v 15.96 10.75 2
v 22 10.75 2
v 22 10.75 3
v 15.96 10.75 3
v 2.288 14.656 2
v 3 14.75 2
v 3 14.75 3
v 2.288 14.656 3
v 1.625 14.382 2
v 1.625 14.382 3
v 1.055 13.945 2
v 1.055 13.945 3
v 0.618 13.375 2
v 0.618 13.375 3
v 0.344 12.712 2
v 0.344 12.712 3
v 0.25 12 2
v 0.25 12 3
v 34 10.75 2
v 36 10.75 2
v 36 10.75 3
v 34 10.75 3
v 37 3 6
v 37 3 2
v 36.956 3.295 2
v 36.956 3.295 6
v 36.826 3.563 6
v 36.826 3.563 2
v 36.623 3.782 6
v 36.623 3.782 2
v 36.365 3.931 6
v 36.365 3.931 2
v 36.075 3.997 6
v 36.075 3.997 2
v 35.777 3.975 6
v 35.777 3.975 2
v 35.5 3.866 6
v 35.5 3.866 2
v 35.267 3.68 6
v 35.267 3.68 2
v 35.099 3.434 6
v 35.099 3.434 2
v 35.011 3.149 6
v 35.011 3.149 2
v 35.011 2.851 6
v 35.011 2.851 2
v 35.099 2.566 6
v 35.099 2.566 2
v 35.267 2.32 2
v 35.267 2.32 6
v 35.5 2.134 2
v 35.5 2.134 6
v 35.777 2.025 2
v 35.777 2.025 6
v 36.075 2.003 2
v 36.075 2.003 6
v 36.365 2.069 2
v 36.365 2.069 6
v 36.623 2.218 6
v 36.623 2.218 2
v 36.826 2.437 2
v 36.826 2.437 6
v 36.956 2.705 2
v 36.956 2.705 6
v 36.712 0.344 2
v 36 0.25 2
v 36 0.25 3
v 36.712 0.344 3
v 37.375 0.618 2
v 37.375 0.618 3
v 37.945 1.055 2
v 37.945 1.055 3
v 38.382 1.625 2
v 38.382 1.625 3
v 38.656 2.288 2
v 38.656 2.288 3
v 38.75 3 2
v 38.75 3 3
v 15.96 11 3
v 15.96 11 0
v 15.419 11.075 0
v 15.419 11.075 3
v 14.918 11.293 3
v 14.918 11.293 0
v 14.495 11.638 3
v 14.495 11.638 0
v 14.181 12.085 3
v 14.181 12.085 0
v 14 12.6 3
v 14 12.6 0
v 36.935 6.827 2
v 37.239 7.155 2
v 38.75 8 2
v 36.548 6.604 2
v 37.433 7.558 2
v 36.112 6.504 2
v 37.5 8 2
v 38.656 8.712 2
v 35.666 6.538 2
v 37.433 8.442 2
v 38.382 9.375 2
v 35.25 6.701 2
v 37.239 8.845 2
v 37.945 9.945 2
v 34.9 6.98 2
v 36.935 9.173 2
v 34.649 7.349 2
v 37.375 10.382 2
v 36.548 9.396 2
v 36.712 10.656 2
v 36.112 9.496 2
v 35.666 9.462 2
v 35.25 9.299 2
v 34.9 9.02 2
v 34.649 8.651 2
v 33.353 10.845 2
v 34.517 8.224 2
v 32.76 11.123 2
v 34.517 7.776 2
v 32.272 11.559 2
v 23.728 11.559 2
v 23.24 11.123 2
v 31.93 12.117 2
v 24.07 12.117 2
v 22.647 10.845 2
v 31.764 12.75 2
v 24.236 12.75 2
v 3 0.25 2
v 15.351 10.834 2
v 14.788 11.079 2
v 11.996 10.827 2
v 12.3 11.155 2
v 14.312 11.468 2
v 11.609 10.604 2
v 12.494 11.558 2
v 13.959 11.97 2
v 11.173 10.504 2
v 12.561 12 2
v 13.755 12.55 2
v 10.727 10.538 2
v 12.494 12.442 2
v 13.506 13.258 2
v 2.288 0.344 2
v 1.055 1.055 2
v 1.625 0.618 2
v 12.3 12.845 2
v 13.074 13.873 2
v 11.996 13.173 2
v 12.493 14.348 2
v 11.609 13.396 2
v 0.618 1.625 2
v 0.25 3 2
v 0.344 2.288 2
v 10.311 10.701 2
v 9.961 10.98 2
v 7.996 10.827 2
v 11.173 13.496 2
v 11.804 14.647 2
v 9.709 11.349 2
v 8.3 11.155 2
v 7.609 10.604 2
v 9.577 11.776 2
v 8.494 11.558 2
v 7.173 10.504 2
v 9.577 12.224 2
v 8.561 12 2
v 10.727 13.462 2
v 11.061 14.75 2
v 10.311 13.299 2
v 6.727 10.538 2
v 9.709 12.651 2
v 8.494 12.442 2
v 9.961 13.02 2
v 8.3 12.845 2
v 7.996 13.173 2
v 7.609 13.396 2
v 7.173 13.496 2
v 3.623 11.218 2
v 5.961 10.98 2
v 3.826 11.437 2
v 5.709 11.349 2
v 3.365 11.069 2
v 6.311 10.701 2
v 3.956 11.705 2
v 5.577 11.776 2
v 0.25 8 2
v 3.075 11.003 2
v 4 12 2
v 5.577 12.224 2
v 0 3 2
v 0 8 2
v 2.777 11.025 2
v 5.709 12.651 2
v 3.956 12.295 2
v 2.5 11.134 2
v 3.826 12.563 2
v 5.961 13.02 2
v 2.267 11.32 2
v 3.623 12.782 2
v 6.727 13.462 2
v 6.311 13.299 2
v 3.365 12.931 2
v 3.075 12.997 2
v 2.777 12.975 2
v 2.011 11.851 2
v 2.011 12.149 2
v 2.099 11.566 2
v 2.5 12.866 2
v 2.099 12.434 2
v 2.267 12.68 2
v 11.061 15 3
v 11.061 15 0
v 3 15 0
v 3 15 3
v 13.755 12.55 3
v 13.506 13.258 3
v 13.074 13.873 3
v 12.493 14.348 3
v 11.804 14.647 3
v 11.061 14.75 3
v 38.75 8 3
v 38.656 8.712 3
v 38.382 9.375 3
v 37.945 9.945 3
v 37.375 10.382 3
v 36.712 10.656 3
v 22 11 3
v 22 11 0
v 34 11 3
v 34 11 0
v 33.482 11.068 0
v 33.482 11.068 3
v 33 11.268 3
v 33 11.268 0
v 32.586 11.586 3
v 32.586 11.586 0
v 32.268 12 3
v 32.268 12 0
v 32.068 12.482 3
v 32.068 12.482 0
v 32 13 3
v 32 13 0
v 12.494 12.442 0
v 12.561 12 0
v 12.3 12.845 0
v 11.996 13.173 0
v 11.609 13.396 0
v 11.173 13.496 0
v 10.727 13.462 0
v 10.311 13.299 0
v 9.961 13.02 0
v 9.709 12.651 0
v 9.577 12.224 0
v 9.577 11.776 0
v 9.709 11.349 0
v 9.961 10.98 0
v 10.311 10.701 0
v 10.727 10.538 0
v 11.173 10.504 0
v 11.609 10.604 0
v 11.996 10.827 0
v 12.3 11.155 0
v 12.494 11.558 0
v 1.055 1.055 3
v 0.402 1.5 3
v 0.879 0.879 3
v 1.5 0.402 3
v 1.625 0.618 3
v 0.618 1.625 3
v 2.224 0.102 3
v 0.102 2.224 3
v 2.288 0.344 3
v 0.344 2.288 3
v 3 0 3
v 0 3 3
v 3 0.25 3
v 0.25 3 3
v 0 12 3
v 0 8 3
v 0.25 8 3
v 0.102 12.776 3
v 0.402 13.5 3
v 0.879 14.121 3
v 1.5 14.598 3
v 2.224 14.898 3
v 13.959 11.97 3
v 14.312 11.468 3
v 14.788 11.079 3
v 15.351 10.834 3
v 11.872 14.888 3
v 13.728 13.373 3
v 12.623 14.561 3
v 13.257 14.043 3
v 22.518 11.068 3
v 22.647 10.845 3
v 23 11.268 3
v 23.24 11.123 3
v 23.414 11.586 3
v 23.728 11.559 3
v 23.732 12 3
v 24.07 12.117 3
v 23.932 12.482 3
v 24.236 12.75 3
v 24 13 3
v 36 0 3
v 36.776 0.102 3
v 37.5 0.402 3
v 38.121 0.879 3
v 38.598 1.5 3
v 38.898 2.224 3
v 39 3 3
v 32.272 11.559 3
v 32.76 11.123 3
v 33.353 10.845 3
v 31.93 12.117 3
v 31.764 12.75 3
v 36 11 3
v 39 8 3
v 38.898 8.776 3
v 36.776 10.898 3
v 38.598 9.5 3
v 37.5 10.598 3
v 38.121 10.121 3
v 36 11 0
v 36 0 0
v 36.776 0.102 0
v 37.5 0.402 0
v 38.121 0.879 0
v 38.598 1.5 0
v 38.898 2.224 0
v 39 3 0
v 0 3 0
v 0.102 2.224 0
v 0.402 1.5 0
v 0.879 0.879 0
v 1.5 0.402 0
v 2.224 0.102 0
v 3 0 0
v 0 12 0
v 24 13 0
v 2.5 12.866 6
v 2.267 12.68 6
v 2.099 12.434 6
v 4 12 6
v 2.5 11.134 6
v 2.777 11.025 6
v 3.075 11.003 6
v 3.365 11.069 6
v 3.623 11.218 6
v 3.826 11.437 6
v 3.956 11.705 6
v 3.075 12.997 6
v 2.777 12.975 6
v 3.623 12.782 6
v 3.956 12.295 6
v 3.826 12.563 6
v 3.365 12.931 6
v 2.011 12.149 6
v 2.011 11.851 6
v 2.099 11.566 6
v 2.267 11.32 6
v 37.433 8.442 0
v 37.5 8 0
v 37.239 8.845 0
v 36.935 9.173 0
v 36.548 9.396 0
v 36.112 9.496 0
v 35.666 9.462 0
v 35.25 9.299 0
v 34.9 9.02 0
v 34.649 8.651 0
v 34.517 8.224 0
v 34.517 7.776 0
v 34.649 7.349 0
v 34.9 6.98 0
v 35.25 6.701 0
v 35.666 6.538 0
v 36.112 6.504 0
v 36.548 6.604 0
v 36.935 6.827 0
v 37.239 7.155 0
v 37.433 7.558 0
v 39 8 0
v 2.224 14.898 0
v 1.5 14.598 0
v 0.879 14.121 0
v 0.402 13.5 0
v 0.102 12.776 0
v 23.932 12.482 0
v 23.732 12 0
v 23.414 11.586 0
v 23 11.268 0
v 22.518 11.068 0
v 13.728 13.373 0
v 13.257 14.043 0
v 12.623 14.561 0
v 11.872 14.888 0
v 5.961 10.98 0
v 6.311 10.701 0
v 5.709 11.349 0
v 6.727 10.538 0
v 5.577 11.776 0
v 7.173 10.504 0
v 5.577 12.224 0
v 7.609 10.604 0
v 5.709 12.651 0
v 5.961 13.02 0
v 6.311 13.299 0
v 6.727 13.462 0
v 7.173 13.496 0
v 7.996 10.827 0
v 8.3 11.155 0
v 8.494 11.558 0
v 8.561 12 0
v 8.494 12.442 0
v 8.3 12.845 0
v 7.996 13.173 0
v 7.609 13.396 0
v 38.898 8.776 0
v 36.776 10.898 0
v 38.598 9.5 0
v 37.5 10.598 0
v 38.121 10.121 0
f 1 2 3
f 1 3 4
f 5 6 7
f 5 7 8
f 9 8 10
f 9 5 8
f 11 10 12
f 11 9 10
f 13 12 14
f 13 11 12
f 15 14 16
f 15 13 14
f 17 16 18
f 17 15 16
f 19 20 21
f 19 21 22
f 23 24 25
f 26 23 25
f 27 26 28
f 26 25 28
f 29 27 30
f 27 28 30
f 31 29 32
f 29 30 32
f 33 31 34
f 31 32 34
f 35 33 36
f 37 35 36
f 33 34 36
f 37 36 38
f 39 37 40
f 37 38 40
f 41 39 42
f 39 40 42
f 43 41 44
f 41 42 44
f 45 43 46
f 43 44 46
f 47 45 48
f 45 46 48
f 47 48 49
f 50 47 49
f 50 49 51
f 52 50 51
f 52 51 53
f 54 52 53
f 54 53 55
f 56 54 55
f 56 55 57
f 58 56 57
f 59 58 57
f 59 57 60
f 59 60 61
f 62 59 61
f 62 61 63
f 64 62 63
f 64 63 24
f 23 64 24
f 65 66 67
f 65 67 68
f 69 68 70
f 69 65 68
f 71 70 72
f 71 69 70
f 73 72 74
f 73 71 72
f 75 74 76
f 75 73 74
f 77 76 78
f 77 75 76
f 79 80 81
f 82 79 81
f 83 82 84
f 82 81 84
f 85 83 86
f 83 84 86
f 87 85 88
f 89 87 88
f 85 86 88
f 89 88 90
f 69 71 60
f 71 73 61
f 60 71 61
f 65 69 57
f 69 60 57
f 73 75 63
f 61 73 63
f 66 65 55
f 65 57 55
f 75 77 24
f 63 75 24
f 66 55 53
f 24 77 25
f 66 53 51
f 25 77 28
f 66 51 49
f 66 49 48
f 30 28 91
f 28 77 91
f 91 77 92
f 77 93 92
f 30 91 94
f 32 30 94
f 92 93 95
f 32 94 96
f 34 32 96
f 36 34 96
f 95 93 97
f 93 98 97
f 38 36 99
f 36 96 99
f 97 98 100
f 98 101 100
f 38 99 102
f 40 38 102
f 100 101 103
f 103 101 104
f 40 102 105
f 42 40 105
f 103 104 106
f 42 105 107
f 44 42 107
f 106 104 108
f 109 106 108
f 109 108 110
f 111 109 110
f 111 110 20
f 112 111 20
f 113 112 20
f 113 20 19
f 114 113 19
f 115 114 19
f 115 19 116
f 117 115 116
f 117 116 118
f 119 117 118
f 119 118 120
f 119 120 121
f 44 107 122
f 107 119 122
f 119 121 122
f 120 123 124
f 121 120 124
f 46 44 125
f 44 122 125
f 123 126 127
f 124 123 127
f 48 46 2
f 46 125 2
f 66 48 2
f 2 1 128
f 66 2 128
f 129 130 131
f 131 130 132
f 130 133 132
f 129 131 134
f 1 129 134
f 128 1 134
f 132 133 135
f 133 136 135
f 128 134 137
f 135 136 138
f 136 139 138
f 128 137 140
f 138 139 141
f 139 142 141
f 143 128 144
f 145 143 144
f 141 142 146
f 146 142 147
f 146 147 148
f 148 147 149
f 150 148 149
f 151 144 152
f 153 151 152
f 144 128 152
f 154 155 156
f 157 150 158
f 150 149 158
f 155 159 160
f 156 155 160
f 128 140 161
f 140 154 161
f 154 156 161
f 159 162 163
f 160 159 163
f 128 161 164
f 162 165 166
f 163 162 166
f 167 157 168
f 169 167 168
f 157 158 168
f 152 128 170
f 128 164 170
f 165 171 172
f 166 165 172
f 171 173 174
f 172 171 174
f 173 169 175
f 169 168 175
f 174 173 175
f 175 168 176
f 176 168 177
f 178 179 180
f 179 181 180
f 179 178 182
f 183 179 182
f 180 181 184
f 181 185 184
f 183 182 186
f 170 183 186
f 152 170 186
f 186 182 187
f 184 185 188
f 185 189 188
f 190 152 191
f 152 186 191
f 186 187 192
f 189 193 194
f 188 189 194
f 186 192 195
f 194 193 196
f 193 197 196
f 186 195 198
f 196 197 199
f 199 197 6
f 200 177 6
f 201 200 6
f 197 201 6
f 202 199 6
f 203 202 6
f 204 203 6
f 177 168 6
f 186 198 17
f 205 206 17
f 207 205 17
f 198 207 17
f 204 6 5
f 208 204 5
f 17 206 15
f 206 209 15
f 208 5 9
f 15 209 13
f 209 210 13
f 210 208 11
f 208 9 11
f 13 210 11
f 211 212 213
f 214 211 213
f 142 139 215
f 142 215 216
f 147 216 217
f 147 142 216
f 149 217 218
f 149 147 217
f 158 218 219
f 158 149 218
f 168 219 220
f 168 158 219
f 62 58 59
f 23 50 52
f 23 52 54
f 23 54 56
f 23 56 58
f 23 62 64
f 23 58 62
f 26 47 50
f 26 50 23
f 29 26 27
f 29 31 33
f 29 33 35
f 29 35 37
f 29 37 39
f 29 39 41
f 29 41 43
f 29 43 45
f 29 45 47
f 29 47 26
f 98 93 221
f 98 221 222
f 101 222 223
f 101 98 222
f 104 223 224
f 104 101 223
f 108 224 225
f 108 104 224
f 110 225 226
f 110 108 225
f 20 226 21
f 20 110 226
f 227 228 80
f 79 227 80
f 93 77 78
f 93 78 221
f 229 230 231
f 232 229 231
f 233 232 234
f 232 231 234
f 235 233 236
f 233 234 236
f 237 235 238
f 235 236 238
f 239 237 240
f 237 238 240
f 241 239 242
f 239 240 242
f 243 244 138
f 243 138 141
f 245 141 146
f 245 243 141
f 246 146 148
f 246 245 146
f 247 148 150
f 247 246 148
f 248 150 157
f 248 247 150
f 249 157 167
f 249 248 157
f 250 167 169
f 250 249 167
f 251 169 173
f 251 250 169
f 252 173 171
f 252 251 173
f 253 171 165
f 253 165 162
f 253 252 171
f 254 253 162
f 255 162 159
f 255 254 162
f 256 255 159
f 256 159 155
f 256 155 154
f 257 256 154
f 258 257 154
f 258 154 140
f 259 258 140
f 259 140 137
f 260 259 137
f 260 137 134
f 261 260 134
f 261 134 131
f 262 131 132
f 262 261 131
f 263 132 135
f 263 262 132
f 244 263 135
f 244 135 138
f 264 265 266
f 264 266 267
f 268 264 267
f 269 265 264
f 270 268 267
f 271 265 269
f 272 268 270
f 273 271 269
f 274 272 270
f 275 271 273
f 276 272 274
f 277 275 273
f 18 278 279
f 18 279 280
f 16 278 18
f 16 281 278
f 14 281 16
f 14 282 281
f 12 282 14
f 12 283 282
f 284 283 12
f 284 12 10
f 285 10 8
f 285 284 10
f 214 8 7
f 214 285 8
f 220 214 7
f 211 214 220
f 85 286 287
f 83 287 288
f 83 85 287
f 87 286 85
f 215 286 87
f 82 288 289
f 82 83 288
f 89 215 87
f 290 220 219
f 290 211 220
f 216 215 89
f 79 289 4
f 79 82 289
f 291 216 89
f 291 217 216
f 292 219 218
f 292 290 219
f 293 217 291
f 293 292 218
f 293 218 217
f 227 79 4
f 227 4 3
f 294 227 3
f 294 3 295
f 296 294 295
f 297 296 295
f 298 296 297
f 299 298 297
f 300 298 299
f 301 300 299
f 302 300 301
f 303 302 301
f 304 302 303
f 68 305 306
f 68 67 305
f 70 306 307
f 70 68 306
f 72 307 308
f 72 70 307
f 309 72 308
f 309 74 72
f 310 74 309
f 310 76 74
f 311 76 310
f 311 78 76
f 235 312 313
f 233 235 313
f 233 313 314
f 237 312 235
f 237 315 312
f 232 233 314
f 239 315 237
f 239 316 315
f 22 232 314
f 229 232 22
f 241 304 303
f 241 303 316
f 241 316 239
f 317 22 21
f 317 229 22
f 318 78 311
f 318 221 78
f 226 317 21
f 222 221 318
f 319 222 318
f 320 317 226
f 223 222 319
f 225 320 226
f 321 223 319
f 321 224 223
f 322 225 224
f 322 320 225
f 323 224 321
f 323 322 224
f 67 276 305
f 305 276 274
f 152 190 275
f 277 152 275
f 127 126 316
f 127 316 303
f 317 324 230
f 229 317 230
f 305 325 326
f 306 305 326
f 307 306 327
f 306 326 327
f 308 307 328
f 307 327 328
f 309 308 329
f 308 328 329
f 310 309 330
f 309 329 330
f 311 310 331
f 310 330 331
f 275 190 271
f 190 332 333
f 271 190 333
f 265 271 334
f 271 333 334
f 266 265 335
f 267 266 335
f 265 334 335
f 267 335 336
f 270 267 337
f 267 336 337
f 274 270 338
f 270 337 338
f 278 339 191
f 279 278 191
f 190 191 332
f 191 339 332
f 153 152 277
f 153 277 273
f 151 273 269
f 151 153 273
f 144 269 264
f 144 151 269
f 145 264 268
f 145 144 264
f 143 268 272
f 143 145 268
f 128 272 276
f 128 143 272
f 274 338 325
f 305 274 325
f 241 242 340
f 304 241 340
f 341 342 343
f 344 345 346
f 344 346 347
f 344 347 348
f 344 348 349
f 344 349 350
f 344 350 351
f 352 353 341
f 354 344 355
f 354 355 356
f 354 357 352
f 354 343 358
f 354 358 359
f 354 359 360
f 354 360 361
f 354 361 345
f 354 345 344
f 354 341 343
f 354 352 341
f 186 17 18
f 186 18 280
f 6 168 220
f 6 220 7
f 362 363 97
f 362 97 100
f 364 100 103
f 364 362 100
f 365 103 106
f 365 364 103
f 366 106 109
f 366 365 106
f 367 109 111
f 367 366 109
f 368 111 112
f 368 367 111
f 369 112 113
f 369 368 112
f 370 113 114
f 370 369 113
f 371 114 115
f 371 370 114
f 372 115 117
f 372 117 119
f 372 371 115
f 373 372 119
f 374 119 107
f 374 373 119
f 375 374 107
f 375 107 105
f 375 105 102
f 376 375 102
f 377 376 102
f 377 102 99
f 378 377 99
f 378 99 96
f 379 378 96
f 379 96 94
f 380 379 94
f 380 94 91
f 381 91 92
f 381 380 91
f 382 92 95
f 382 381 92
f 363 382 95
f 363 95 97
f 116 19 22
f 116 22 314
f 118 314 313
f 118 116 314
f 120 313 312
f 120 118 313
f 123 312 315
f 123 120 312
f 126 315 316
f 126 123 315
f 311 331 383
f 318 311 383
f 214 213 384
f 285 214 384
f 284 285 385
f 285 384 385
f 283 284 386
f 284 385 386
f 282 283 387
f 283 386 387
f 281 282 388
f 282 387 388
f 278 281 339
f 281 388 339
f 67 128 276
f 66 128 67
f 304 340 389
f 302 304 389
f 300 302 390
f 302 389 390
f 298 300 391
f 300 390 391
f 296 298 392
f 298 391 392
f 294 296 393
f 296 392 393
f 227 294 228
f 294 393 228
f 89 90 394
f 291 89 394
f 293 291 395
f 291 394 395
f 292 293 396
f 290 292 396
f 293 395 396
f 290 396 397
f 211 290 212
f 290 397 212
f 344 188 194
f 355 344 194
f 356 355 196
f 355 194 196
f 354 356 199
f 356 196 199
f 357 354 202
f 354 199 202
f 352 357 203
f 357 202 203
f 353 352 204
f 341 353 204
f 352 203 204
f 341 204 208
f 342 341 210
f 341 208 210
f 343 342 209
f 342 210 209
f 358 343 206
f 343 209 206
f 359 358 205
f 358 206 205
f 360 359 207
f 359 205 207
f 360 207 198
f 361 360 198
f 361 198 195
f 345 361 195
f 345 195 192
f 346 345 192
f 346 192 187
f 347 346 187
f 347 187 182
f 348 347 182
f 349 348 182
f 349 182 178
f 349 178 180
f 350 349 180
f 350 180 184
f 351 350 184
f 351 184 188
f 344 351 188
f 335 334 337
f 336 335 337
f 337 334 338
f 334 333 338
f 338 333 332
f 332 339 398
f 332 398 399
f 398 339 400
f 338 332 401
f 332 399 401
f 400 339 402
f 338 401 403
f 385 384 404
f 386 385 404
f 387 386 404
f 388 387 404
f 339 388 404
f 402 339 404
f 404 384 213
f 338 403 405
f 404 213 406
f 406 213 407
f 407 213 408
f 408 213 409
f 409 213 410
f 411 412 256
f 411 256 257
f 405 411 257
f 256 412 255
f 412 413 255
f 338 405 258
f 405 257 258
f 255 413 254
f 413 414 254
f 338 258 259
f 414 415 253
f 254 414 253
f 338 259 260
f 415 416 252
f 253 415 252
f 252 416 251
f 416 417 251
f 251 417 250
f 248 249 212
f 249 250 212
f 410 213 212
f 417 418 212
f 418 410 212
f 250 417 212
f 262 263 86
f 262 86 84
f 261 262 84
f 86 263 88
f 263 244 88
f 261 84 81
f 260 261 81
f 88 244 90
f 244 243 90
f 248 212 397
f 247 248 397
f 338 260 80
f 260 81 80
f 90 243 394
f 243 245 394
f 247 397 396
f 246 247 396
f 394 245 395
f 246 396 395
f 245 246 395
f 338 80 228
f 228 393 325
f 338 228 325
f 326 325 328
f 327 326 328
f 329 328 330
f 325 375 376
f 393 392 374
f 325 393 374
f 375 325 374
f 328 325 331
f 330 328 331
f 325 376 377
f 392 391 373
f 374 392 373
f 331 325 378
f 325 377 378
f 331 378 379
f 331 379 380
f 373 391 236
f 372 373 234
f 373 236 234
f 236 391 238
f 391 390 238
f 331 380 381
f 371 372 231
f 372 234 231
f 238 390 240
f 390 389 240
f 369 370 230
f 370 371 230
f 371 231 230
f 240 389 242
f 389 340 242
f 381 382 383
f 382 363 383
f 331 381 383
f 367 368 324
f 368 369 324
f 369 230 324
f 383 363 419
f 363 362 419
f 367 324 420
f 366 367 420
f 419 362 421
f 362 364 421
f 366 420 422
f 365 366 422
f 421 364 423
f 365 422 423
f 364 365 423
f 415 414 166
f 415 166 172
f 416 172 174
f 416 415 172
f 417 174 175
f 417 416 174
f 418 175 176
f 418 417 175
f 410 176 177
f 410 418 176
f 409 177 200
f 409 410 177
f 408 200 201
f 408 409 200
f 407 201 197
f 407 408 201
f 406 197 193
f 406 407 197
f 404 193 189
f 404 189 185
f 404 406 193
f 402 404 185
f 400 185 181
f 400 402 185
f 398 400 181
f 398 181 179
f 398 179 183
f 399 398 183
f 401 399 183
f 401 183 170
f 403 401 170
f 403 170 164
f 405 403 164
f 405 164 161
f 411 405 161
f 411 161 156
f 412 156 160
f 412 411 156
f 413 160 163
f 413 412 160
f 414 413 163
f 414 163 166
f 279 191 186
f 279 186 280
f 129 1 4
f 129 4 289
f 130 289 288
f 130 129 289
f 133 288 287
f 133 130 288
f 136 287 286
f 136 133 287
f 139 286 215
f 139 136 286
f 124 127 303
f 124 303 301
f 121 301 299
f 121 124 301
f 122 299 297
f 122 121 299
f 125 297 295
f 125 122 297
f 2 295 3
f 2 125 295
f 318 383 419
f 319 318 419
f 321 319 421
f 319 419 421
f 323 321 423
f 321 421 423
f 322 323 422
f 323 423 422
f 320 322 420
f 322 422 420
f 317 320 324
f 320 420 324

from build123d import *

# Parameters (mm, degrees)
SKETCH1_R           = 1
SKETCH1_R_2         = 1.5
BOSS_EXTRUDE1_DEPTH = 2
BOSS_EXTRUDE2_DEPTH = 3
SKETCH1_4_R         = 1
BOSS_EXTRUDE3_DEPTH = 6
SKETCH2_W           = 4
SKETCH2_H           = 5
CUT_EXTRUDE1_DEPTH  = 3


with BuildPart() as part:
    # Sketch1 → Boss-Extrude1 (new body)
    with BuildSketch(Plane.XY):
        with BuildLine():
            ThreePointArc((0.25, 3), (1.055456352, 1.055456352), (3, 0.25))
            Line((3, 0.25), (36, 0.25))
            ThreePointArc((36, 0.25), (37.944543648, 1.055456352), (38.75, 3))
            Line((38.75, 3), (38.75, 8))
            ThreePointArc((38.75, 8), (37.944543648, 9.944543648), (36, 10.75))
            Line((36, 10.75), (34, 10.75))
            ThreePointArc((34, 10.75), (32.5, 11.322949017), (31.763932023, 12.75))
            Line((31.763932023, 12.75), (24.236067977, 12.75))
            ThreePointArc((24.236067977, 12.75), (23.5, 11.322949017), (22, 10.75))
            Line((22, 10.75), (15.959591794, 10.75))
            ThreePointArc((15.959591794, 10.75), (14.536566847, 11.257157494), (13.755051026, 12.55))
            ThreePointArc((13.755051026, 12.55), (12.799865022, 14.13014084), (11.060612309, 14.75))
            Line((11.060612309, 14.75), (3, 14.75))
            ThreePointArc((3, 14.75), (1.055456352, 13.944543648), (0.25, 12))
            Line((0.25, 12), (0.25, 3))
        make_face()
        with Locations((36, 3)):
            Circle(SKETCH1_R, mode=Mode.SUBTRACT)
        with Locations((3, 12)):
            Circle(SKETCH1_R, mode=Mode.SUBTRACT)
        with Locations((7.060612309, 12)):
            Circle(SKETCH1_R_2, mode=Mode.SUBTRACT)
        with Locations((11.060612309, 12)):
            Circle(SKETCH1_R_2, mode=Mode.SUBTRACT)
        with Locations((36, 8)):
            Circle(SKETCH1_R_2, mode=Mode.SUBTRACT)
    extrude(amount=BOSS_EXTRUDE1_DEPTH)

    # Sketch1<3> → Boss-Extrude2 (add)
    with BuildSketch(Plane.XY):
        with BuildLine():
            Line((3, 0), (36, 0))
            ThreePointArc((36, 0), (38.121320344, 0.878679656), (39, 3))
            Line((39, 3), (39, 8))
            ThreePointArc((39, 8), (38.121320344, 10.121320344), (36, 11))
            Line((36, 11), (34, 11))
            ThreePointArc((34, 11), (32.585786438, 11.585786438), (32, 13))
            Line((32, 13), (24, 13))
            ThreePointArc((24, 13), (23.414213562, 11.585786438), (22, 11))
            Line((22, 11), (15.959591794, 11))
            ThreePointArc((15.959591794, 11), (14.69468073, 11.450806662), (14, 12.6))
            ThreePointArc((14, 12.6), (12.957978905, 14.323790008), (11.060612309, 15))
            Line((11.060612309, 15), (3, 15))
            ThreePointArc((3, 15), (0.878679656, 14.121320344), (0, 12))
            Line((0, 12), (0, 3))
            ThreePointArc((0, 3), (0.878679656, 0.878679656), (3, 0))
        make_face()
        with BuildLine():
            Line((3, 0.25), (36, 0.25))
            ThreePointArc((36, 0.25), (37.944543648, 1.055456352), (38.75, 3))
            Line((38.75, 3), (38.75, 8))
            ThreePointArc((38.75, 8), (37.944543648, 9.944543648), (36, 10.75))
            Line((36, 10.75), (34, 10.75))
            ThreePointArc((34, 10.75), (32.5, 11.322949017), (31.763932023, 12.75))
            Line((31.763932023, 12.75), (24.236067977, 12.75))
            ThreePointArc((24.236067977, 12.75), (23.5, 11.322949017), (22, 10.75))
            Line((22, 10.75), (15.959591794, 10.75))
            ThreePointArc((15.959591794, 10.75), (14.536566847, 11.257157494), (13.755051026, 12.55))
            ThreePointArc((13.755051026, 12.55), (12.799865022, 14.13014084), (11.060612309, 14.75))
            Line((11.060612309, 14.75), (3, 14.75))
            ThreePointArc((3, 14.75), (1.055456352, 13.944543648), (0.25, 12))
            Line((0.25, 12), (0.25, 3))
            ThreePointArc((0.25, 3), (1.055456352, 1.055456352), (3, 0.25))
        make_face(mode=Mode.SUBTRACT)
    extrude(amount=BOSS_EXTRUDE2_DEPTH)

    # Sketch1<4> → Boss-Extrude3 (add)
    with BuildSketch(Plane.XY):
        with Locations((3, 12)):
            Circle(SKETCH1_4_R)
        with Locations((36, 3)):
            Circle(SKETCH1_4_R)
    extrude(amount=BOSS_EXTRUDE3_DEPTH)

    # Sketch2 → Cut-Extrude1 (cut, symmetric)
    with BuildSketch(Plane.ZY):
        with Locations((4, 5.5)):
            Rectangle(SKETCH2_W, SKETCH2_H)
    extrude(amount=CUT_EXTRUDE1_DEPTH, both=True, mode=Mode.SUBTRACT)


solid = part.part
